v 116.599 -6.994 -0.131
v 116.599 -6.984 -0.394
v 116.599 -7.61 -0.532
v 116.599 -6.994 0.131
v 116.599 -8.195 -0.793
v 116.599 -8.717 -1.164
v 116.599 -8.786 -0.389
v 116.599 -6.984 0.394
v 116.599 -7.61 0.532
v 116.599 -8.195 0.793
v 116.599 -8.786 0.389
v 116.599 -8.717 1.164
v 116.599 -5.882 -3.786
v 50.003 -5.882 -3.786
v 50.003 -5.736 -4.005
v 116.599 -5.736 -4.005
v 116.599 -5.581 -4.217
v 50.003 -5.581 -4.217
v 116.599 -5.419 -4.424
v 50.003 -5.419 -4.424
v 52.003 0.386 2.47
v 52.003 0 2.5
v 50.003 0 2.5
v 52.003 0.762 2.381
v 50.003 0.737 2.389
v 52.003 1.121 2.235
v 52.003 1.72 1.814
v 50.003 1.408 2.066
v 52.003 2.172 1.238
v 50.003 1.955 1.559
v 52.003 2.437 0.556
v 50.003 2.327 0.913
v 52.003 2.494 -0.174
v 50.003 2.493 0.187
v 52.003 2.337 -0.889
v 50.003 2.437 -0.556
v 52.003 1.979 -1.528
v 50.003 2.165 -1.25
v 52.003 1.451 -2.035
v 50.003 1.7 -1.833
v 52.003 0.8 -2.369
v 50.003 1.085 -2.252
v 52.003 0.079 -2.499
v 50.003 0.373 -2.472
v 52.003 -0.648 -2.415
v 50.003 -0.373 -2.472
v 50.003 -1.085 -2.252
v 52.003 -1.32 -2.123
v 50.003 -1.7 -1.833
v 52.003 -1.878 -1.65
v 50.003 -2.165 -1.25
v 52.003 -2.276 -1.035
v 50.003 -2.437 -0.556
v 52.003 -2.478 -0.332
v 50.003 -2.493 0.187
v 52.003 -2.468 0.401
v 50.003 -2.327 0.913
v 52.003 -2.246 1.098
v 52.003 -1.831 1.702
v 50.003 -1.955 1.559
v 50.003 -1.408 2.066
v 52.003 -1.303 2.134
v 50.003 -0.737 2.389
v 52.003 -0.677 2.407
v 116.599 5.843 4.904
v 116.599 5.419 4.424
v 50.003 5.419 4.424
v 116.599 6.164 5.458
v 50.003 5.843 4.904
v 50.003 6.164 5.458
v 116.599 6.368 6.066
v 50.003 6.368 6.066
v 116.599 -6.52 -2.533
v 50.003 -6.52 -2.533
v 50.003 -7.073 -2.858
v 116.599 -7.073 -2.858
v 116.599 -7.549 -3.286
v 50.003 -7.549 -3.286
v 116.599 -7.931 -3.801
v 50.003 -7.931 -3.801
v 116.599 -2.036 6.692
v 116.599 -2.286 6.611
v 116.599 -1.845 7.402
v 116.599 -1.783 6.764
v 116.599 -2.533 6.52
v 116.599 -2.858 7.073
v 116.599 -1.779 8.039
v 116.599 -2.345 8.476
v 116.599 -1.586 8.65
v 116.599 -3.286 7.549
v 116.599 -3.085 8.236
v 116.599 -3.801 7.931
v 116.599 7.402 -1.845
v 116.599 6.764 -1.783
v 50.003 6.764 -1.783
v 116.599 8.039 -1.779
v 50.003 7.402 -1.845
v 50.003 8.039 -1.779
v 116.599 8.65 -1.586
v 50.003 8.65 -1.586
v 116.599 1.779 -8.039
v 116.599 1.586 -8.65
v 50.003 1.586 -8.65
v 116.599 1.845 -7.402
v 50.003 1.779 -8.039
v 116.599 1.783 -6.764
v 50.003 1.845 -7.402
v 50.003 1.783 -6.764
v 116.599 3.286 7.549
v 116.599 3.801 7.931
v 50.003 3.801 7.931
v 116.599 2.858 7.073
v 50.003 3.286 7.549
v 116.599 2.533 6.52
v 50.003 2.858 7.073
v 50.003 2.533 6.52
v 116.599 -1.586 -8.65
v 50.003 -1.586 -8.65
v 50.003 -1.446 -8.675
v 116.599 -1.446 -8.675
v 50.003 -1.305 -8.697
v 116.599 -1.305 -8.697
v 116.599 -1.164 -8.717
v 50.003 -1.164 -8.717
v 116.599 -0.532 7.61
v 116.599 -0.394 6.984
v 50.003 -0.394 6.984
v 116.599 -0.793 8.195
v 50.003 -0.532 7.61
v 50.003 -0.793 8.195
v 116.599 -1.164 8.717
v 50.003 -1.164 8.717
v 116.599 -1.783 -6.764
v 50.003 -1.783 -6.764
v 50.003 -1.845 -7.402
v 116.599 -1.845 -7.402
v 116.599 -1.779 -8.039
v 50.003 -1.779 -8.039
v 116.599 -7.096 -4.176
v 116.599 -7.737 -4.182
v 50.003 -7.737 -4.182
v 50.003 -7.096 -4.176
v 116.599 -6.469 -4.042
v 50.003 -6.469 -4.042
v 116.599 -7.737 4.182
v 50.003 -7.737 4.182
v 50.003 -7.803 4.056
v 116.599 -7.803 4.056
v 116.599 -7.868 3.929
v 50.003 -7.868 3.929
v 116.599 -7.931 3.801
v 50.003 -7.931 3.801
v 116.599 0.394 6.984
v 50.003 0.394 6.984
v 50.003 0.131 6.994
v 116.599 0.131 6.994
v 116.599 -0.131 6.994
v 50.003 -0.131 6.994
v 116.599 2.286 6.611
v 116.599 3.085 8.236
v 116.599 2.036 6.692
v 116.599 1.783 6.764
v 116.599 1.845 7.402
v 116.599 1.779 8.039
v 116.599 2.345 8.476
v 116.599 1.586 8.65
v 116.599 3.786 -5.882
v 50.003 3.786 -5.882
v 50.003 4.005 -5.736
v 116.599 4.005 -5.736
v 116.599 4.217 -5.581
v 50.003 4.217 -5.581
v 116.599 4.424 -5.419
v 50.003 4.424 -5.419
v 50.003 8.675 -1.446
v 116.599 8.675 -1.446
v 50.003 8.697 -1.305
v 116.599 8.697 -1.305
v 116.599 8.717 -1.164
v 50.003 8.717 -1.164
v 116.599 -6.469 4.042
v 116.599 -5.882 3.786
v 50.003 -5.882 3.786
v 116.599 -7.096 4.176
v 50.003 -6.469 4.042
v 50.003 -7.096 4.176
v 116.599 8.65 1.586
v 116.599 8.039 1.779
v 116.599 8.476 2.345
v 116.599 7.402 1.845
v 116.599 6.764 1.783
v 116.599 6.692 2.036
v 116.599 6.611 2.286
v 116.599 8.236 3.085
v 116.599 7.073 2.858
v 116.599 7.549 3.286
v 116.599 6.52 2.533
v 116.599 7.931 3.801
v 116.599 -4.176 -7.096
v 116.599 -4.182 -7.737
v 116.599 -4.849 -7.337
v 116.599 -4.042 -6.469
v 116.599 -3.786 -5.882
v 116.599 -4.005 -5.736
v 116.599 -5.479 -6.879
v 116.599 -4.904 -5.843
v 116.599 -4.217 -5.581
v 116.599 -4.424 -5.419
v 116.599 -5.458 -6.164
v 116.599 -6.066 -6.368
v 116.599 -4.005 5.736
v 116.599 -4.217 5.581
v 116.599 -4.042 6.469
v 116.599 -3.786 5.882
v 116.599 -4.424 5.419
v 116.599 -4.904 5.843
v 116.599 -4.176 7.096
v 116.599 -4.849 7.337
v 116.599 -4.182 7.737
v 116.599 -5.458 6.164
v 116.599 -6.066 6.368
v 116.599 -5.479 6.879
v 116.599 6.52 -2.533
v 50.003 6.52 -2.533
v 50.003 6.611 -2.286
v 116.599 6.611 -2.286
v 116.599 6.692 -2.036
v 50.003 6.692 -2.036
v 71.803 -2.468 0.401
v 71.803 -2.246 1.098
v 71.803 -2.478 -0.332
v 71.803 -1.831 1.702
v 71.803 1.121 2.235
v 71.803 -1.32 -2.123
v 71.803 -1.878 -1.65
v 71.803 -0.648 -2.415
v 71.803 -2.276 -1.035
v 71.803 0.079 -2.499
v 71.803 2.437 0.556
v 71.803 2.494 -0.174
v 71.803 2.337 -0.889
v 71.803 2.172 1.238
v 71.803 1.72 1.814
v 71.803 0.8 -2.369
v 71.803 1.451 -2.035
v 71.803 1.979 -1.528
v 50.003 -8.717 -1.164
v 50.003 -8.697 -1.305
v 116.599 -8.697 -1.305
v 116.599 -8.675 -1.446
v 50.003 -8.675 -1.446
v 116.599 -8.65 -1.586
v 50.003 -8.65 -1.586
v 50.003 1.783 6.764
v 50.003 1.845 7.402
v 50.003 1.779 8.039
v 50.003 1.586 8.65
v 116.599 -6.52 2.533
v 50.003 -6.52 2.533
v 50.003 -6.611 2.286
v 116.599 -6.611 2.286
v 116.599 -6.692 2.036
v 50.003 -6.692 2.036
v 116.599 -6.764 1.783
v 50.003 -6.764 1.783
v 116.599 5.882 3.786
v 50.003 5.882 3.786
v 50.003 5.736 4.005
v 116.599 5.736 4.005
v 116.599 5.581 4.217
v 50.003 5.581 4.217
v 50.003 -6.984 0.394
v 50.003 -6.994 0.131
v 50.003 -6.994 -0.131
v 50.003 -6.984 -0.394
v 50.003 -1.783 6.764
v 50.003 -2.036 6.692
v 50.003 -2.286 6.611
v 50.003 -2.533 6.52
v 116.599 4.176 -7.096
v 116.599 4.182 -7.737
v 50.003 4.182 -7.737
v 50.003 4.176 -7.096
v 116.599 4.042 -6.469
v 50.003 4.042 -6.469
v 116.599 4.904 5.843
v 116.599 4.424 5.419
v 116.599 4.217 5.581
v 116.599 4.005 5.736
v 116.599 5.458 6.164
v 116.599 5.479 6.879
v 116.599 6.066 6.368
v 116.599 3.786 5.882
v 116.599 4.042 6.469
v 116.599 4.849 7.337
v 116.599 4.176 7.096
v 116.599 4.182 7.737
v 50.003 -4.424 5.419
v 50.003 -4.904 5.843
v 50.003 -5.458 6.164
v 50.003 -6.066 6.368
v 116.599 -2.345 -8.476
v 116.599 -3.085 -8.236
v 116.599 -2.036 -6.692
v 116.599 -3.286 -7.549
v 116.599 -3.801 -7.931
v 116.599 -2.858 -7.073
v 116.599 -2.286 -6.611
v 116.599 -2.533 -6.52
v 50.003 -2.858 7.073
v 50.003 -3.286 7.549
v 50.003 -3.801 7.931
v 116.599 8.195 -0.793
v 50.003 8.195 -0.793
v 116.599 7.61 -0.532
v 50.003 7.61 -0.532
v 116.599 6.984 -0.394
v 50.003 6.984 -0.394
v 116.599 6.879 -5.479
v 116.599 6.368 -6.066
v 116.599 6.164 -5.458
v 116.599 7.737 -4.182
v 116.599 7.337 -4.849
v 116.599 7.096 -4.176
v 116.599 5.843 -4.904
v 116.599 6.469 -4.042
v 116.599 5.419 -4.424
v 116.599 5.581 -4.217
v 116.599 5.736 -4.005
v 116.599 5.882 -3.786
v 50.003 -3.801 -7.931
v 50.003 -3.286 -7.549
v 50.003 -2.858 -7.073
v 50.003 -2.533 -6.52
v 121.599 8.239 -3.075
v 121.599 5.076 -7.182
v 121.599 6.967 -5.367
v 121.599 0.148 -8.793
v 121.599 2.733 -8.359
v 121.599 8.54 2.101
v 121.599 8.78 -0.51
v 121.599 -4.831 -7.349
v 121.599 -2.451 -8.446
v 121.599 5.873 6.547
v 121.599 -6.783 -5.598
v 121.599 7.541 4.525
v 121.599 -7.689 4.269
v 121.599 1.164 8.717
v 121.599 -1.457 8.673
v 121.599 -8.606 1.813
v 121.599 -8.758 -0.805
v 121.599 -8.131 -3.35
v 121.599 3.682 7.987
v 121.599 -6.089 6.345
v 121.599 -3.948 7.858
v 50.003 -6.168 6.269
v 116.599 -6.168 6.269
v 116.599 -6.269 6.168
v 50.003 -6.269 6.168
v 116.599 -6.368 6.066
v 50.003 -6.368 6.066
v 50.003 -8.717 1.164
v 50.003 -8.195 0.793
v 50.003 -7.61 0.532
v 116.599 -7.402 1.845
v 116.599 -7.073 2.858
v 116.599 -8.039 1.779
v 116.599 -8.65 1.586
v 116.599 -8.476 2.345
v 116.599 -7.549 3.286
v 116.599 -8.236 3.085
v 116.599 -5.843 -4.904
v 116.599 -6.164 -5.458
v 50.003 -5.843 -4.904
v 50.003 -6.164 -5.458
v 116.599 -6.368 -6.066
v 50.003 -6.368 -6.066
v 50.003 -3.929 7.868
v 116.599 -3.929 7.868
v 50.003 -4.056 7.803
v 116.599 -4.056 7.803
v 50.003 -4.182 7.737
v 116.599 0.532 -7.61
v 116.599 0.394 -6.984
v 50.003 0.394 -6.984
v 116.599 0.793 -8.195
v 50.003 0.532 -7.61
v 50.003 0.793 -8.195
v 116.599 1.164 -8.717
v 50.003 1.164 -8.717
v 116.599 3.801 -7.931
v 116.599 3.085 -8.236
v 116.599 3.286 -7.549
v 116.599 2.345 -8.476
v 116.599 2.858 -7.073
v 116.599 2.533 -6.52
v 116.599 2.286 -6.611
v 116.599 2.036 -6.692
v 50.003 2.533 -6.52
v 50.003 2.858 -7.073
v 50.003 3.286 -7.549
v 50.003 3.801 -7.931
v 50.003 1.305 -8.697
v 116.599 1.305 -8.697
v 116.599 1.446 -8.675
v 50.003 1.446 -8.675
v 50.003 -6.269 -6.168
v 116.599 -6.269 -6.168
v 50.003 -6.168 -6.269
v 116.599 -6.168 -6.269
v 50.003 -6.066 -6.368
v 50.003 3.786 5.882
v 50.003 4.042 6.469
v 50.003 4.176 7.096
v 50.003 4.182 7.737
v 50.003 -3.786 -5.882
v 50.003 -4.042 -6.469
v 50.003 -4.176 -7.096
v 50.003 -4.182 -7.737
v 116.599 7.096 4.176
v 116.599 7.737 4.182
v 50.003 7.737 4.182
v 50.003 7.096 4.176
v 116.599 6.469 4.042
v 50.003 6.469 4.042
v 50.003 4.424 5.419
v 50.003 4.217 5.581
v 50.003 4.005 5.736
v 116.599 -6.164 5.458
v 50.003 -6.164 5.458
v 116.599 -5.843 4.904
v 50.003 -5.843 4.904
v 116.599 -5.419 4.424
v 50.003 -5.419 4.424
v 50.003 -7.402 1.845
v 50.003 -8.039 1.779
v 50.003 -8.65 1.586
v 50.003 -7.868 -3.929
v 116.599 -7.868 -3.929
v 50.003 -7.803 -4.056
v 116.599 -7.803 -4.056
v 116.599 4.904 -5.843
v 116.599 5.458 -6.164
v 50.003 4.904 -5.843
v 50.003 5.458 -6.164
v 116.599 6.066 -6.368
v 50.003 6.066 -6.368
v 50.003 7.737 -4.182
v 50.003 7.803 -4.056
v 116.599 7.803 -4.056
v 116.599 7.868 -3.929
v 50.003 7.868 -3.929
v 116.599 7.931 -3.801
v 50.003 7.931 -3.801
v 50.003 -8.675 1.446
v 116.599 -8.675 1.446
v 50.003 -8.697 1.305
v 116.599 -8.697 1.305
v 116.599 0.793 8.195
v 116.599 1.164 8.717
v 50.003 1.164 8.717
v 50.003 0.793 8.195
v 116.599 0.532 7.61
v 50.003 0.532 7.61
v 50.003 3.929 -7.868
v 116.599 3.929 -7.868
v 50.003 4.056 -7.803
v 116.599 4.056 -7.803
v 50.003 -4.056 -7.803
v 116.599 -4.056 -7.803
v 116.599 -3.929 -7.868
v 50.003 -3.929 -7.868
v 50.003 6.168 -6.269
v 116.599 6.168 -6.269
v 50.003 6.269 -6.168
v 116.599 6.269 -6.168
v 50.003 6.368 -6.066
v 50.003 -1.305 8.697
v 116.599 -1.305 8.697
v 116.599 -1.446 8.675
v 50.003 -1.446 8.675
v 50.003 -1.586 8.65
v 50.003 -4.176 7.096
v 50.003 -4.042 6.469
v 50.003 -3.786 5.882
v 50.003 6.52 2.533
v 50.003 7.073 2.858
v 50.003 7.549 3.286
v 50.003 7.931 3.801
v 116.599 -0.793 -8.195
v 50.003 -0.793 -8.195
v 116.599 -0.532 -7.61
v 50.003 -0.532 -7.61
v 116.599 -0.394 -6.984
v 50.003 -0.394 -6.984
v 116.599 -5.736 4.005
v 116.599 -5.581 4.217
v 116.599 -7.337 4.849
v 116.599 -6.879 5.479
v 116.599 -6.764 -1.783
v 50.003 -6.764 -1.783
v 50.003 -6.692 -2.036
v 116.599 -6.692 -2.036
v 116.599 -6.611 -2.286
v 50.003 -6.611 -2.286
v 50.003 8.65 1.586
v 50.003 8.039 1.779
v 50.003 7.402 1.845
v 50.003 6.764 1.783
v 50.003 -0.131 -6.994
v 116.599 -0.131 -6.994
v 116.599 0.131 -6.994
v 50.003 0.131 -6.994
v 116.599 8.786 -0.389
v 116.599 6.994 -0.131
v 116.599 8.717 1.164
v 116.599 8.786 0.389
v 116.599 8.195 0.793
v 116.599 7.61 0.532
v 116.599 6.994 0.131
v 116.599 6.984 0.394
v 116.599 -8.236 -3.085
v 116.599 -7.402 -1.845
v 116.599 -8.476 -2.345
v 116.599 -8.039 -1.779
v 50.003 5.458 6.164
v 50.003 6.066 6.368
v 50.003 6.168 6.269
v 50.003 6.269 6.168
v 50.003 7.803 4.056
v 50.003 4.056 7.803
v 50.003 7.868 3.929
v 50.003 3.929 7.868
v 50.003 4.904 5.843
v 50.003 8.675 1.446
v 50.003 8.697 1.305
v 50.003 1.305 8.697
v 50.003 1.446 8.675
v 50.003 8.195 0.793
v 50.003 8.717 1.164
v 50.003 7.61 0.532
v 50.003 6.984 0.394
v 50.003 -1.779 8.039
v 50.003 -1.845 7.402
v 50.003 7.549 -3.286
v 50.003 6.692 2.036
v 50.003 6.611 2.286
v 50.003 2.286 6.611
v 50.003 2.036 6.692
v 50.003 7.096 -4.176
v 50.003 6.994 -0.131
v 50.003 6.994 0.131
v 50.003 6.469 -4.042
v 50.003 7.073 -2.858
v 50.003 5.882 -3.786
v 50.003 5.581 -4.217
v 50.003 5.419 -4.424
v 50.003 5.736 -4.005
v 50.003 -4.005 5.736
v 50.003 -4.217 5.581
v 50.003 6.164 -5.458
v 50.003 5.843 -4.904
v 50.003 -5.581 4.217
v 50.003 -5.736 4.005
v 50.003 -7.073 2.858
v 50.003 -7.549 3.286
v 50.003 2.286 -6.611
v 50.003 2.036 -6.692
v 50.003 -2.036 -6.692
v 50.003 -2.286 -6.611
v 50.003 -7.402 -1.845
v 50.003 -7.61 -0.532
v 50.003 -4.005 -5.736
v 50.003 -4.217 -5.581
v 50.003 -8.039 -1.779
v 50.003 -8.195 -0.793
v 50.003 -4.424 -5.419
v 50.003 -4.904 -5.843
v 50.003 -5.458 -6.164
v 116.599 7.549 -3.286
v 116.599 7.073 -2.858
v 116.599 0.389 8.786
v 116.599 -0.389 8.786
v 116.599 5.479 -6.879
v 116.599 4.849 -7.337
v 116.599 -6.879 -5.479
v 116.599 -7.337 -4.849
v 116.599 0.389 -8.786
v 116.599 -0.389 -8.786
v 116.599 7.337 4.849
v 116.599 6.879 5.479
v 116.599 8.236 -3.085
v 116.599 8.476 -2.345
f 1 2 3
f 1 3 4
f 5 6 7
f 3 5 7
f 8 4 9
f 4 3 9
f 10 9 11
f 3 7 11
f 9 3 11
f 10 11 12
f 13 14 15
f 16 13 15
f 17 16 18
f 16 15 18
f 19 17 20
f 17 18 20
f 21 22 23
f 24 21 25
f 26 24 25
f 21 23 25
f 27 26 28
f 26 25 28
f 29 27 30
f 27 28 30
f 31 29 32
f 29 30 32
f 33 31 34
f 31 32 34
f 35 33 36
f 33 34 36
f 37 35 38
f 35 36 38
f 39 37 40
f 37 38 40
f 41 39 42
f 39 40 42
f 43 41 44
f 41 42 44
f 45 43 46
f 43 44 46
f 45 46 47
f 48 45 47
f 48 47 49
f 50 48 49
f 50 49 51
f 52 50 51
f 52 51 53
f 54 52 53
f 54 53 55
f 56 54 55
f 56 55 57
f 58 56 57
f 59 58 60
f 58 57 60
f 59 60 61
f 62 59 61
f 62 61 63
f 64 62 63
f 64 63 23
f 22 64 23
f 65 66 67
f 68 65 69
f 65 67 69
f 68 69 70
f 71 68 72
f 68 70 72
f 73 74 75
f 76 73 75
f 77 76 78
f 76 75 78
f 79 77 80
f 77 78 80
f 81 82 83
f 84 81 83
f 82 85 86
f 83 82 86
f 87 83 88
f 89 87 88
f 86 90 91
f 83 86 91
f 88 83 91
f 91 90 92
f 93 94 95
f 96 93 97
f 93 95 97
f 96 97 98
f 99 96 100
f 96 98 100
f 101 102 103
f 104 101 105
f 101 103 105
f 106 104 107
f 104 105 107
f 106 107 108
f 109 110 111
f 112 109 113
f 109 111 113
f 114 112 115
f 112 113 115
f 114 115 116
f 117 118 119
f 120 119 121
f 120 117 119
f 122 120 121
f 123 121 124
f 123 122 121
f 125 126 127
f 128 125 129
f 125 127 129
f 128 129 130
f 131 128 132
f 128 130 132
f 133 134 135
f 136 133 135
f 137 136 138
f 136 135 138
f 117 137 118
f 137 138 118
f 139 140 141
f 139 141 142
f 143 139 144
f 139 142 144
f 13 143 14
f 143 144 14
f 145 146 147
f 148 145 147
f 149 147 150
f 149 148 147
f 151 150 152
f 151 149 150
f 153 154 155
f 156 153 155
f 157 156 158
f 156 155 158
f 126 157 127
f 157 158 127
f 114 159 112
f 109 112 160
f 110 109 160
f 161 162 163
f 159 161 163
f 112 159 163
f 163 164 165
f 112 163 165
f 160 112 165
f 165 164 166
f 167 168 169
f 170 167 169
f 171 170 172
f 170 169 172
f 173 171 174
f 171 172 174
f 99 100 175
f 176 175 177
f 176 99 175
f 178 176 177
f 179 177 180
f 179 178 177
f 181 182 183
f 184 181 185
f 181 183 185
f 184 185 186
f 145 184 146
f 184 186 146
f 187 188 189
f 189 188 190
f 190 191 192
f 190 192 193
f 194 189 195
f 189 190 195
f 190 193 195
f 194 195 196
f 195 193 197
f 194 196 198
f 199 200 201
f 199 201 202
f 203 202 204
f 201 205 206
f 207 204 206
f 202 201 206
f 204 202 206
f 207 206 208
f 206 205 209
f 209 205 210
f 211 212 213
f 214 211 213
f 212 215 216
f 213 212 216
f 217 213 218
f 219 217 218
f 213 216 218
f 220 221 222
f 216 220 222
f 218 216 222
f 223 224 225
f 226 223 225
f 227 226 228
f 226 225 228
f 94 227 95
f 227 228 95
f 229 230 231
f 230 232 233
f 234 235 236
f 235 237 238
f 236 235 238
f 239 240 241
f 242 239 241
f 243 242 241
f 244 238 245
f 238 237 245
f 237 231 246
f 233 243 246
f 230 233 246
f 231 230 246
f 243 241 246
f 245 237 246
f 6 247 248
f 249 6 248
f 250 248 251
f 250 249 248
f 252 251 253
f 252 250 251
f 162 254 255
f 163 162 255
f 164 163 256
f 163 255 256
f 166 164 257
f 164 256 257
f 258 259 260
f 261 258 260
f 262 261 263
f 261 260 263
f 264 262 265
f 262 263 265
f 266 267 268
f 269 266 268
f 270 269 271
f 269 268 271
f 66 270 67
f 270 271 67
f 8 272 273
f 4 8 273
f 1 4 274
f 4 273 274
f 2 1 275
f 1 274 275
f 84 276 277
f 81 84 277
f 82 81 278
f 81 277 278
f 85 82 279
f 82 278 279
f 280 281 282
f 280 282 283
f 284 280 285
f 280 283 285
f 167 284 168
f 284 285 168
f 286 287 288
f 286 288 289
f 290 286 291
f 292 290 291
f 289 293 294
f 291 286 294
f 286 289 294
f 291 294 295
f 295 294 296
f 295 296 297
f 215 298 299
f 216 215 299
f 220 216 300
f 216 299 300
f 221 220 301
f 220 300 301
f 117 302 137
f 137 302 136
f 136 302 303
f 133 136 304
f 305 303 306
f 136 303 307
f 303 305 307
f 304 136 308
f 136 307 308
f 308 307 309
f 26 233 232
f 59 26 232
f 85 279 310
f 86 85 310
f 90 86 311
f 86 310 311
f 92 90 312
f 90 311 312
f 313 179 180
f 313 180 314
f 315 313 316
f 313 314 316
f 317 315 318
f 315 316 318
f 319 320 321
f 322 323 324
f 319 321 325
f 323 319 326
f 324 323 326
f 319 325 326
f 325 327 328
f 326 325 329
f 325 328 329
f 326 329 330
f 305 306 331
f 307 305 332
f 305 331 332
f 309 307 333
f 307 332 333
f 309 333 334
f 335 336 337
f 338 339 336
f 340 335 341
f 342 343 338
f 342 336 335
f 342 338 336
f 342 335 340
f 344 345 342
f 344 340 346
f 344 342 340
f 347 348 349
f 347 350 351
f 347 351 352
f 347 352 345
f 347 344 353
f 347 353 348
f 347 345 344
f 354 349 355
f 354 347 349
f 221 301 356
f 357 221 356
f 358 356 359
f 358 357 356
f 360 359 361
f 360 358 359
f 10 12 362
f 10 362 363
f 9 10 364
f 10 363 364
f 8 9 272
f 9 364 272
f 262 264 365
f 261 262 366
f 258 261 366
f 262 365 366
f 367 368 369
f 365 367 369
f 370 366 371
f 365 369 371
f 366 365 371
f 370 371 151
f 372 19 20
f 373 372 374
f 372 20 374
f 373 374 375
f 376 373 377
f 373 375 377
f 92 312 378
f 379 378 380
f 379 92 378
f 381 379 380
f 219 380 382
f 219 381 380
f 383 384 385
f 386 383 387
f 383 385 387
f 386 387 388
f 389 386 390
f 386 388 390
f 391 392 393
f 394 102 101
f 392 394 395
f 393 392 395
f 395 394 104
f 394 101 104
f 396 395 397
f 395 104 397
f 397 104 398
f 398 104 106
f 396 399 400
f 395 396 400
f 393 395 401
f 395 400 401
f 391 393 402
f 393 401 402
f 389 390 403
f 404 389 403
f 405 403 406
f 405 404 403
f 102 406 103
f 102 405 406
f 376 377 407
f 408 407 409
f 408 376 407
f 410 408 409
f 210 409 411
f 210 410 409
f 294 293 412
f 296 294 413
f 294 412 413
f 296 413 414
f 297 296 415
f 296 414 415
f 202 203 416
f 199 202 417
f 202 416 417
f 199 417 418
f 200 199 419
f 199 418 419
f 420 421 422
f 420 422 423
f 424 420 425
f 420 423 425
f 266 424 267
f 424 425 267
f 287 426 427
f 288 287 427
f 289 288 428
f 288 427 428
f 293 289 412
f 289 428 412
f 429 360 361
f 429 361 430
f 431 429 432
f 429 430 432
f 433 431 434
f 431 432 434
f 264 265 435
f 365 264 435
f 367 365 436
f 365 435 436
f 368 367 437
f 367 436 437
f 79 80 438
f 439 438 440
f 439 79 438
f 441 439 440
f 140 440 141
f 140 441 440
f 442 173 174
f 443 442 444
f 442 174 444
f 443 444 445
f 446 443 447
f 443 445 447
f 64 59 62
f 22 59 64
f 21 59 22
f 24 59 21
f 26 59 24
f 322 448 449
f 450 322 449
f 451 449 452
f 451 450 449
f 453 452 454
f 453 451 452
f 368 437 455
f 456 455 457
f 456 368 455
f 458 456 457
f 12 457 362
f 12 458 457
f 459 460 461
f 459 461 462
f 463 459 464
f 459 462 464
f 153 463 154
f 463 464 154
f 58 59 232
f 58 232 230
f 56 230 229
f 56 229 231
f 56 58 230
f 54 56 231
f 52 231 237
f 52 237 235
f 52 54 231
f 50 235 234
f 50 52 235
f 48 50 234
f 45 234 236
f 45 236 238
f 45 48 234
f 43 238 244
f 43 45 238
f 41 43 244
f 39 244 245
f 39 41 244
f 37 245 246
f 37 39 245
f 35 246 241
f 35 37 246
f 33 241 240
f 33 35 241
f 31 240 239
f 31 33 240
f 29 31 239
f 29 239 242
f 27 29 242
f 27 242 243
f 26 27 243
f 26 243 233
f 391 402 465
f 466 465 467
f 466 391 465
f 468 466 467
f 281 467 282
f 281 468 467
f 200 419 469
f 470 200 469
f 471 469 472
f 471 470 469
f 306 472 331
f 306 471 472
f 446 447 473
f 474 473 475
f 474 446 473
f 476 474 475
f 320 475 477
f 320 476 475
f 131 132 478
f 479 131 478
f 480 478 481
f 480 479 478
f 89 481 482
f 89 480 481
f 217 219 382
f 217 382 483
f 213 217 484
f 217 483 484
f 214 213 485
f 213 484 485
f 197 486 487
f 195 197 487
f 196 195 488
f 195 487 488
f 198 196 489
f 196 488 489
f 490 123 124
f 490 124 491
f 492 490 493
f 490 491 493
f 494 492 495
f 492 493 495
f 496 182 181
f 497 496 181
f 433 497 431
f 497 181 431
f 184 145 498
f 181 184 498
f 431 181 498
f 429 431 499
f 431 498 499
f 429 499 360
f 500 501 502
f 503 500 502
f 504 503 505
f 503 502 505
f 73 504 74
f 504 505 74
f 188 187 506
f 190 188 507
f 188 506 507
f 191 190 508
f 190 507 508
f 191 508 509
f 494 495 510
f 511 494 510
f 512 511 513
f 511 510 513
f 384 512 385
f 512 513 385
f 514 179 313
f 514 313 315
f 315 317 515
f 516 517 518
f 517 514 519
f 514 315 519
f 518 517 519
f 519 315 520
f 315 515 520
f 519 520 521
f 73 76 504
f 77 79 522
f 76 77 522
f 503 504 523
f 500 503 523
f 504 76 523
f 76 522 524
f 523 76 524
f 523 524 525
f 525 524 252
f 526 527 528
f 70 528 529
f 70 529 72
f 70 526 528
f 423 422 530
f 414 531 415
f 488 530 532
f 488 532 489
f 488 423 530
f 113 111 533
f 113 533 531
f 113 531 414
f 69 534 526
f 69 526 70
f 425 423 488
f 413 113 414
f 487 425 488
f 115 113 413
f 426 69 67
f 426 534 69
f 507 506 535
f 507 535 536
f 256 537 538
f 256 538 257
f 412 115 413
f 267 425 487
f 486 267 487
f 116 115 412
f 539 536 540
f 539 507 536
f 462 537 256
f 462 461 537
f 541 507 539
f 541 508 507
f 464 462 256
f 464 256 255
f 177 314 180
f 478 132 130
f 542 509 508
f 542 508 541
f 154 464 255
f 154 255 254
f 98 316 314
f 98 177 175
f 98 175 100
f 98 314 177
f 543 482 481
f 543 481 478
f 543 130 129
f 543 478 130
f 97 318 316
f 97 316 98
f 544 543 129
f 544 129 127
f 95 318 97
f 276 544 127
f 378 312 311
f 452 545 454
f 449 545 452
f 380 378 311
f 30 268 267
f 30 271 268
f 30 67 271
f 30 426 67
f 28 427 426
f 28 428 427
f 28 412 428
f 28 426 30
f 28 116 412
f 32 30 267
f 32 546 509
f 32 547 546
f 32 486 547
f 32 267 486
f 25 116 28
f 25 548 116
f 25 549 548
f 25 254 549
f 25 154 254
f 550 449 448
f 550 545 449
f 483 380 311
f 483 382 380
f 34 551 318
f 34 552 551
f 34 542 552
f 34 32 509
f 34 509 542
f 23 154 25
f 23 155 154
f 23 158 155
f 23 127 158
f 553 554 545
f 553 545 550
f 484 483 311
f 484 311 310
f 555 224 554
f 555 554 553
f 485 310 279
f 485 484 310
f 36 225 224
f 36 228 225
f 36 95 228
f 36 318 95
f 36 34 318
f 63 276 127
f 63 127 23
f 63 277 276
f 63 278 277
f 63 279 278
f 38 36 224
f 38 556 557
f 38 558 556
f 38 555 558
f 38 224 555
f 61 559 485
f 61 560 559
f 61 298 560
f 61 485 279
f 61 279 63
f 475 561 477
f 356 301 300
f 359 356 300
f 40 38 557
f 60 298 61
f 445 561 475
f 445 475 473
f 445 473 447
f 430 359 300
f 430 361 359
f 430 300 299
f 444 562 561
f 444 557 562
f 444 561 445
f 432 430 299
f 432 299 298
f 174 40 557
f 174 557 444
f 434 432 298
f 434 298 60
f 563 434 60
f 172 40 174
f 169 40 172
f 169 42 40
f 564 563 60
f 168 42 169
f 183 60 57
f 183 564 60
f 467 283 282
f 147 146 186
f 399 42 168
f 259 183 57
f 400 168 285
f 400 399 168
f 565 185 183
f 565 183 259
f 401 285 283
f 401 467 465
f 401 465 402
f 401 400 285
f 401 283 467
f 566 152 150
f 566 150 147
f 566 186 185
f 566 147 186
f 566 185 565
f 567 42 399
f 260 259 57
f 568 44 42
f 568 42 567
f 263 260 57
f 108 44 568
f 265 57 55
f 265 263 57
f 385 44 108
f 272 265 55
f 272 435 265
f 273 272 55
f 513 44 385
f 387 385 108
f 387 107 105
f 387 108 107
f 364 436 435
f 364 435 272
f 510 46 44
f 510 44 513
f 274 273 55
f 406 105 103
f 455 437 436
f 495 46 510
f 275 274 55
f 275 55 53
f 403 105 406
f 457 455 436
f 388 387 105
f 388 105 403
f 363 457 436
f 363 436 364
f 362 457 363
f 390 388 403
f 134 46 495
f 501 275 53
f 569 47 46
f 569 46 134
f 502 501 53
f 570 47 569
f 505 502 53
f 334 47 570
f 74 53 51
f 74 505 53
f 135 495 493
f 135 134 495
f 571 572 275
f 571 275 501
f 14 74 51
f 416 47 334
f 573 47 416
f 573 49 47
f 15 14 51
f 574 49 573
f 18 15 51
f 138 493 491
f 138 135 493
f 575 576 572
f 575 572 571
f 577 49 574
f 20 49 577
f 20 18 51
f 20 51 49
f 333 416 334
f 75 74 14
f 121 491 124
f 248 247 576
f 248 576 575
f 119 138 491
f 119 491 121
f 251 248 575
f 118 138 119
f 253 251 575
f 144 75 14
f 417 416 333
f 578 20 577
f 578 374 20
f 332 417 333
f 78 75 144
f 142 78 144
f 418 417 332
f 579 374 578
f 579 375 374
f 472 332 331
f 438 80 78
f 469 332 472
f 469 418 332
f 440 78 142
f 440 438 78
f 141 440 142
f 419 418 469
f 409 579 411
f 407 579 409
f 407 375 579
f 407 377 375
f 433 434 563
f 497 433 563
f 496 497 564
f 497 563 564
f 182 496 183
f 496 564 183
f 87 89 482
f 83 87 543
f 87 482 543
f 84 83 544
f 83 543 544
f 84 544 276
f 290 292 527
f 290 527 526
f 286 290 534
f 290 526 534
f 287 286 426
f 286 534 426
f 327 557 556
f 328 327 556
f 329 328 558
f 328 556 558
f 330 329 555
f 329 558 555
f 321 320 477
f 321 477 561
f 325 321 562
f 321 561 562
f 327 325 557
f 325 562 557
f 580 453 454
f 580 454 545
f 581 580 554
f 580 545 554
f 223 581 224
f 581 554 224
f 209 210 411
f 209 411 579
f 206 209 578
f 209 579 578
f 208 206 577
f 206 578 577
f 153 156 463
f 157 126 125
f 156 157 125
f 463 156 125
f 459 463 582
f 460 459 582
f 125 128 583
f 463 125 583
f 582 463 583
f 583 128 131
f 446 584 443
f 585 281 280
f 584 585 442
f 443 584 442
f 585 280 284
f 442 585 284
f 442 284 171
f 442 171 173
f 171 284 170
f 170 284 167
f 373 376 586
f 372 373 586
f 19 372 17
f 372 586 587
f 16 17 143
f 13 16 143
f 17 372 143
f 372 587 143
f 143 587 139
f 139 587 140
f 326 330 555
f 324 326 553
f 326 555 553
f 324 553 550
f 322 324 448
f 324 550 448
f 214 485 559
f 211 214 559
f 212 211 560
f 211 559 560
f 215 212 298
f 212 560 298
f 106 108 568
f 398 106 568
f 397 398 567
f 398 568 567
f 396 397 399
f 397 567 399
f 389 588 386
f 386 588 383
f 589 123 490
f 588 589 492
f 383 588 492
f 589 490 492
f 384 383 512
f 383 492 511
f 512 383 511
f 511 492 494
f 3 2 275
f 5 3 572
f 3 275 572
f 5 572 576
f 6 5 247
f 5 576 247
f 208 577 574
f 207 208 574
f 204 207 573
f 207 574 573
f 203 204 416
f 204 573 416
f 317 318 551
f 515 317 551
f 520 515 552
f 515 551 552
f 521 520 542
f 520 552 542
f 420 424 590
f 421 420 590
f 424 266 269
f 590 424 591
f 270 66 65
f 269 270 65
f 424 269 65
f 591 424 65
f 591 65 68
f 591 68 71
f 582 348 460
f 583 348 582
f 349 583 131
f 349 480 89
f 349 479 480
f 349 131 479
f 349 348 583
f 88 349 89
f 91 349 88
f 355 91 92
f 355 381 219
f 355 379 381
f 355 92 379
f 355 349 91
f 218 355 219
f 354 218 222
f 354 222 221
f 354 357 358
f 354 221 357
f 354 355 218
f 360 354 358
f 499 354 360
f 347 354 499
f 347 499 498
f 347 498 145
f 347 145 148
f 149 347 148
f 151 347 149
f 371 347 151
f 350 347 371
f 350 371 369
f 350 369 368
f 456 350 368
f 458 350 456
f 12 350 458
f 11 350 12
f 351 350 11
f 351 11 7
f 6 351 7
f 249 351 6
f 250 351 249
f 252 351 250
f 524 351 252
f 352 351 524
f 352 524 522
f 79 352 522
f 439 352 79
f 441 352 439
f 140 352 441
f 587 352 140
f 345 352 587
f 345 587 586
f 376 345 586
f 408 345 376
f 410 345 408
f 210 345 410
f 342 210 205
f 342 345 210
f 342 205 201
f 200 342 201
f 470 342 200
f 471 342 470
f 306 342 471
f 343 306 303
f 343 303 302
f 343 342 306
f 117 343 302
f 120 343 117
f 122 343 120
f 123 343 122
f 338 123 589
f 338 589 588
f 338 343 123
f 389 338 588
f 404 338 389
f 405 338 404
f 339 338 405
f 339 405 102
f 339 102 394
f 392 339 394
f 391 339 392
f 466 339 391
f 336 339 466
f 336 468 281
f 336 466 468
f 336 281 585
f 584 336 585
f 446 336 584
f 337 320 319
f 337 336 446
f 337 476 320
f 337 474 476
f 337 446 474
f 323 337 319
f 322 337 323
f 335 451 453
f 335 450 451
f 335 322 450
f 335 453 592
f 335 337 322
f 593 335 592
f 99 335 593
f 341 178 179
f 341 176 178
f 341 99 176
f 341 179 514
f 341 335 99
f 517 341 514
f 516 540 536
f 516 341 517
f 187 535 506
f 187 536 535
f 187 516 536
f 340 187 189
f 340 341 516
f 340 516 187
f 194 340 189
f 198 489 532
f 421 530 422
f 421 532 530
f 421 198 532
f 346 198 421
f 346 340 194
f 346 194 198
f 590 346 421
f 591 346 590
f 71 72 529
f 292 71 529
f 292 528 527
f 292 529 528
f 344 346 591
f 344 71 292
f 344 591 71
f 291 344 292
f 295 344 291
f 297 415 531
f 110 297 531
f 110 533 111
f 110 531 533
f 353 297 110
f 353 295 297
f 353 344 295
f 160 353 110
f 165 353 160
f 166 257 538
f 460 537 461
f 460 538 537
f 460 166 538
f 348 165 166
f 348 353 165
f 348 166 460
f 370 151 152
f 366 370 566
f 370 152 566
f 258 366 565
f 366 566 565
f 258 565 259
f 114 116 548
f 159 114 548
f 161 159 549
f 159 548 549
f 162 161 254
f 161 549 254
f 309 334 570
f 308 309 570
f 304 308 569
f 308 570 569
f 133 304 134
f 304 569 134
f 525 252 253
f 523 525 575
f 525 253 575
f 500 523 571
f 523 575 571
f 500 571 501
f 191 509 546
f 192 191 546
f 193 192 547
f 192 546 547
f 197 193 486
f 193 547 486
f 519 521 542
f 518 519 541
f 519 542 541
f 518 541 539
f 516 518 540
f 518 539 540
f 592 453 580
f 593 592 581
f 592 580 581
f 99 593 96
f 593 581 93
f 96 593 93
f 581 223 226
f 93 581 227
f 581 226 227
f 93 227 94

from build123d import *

# Parameters (mm, degrees)
BASPROSKE_W         = 166.593250705
BASPROSKE_H         = 22
TOOTHCUT_DEPTH      = 170.47362975
TEETHCUTS_COUNT     = 20
TEETHCUTS_ANGLE     = 342
BORSKE_R            = 0.4
BORE_DEPTH          = 50.0000508
SCALE1_SCALE        = 0.399751684
SKETCH3_R           = 2.5
CUT_EXTRUDE3_DEPTH  = 2
CUT_EXTRUDE4_DEPTH  = 19.8
BOSS_EXTRUDE1_START = 5
SKETCH5_R           = 8.794537041
BOSS_EXTRUDE1_DEPTH = 5


with BuildPart() as part:
    # BasProSke → Base-Revolve (revolve)
    with BuildSketch(Plane(origin=(0, 0, 0), x_dir=(1, 0, 0), z_dir=(0, 1, 0)), mode=Mode.PRIVATE) as base_revolve_sk:
        with Locations((83.296625353, 11)):
            Rectangle(BASPROSKE_W, BASPROSKE_H)
    revolve(base_revolve_sk.sketch.rotate(Axis((-10, 0, 0), (1, 0, 0)), 180), axis=Axis((-10, 0, 0), (1, 0, 0)))

    # TooCutSke → ToothCut (cut, through all)
    with BuildSketch(Plane(origin=(0, 0, 0), x_dir=(0, 0, -1), z_dir=(1, 0, 0))):
        with BuildLine():
            ThreePointArc((0.986171591, 17.471189616), (0, 17.499), (-0.986171591, 17.471189616))
            ThreePointArc((-0.986171591, 17.471189616), (-1.626916196, 19.798789858), (-2.932850173, 21.829260982))
            ThreePointArc((-2.932850173, 21.829260982), (0, 22.0254), (2.932850173, 21.829260982))
            ThreePointArc((2.932850173, 21.829260982), (1.626916196, 19.798789858), (0.986171591, 17.471189616))
        make_face()
    toothcut = extrude(amount=TOOTHCUT_DEPTH, mode=Mode.SUBTRACT)

    # TeethCuts: ToothCut ×20 about axis
    teethcuts_axis = Axis((-10, 0, 0), (1, 0, 0))
    for i in range(1, TEETHCUTS_COUNT):
        add(toothcut.rotate(teethcuts_axis, i * TEETHCUTS_ANGLE / (TEETHCUTS_COUNT - 1)), mode=Mode.SUBTRACT)

    # BorSke → Bore (cut, symmetric)
    with BuildSketch(Plane(origin=(0, 0, 0), x_dir=(0, 0, -1), z_dir=(1, 0, 0))):
        Circle(BORSKE_R)
    extrude(amount=BORE_DEPTH, both=True, mode=Mode.SUBTRACT)


with BuildPart() as part_1:
    # Scale1: scaled about (83.303871456, 0, 0)
    add(part.part.scale(SCALE1_SCALE).moved(Location((50.003008586, 0, 0))))

    # Sketch3 → Cut-Extrude3 (cut)
    with BuildSketch(Plane.ZY.offset(-50.003008586)):
        Circle(SKETCH3_R)
    extrude(amount=-CUT_EXTRUDE3_DEPTH, mode=Mode.SUBTRACT)

    # Sketch4 → Cut-Extrude4 (cut)
    with BuildSketch(Plane.ZY.offset(-52.003008586)):
        with BuildLine():
            Line((2.234682225, 1.120801211), (1.701680185, -1.831470597))
            ThreePointArc((1.701680185, -1.831470597), (-2.460226506, 0.444168366), (2.234682225, 1.120801211))
        make_face()
    extrude(amount=-CUT_EXTRUDE4_DEPTH, mode=Mode.SUBTRACT)

    # Sketch5 → Boss-Extrude1 (add)
    with BuildSketch(Plane(origin=(116.598941042, 0, 0), x_dir=(0, 0, -1), z_dir=(1, 0, 0)).offset(BOSS_EXTRUDE1_START)):
        with Locations(Location((0, 0, 0), (0, 0, 172.391971096))):
            Circle(SKETCH5_R)
    extrude(amount=-BOSS_EXTRUDE1_DEPTH)


solid = part_1.part
